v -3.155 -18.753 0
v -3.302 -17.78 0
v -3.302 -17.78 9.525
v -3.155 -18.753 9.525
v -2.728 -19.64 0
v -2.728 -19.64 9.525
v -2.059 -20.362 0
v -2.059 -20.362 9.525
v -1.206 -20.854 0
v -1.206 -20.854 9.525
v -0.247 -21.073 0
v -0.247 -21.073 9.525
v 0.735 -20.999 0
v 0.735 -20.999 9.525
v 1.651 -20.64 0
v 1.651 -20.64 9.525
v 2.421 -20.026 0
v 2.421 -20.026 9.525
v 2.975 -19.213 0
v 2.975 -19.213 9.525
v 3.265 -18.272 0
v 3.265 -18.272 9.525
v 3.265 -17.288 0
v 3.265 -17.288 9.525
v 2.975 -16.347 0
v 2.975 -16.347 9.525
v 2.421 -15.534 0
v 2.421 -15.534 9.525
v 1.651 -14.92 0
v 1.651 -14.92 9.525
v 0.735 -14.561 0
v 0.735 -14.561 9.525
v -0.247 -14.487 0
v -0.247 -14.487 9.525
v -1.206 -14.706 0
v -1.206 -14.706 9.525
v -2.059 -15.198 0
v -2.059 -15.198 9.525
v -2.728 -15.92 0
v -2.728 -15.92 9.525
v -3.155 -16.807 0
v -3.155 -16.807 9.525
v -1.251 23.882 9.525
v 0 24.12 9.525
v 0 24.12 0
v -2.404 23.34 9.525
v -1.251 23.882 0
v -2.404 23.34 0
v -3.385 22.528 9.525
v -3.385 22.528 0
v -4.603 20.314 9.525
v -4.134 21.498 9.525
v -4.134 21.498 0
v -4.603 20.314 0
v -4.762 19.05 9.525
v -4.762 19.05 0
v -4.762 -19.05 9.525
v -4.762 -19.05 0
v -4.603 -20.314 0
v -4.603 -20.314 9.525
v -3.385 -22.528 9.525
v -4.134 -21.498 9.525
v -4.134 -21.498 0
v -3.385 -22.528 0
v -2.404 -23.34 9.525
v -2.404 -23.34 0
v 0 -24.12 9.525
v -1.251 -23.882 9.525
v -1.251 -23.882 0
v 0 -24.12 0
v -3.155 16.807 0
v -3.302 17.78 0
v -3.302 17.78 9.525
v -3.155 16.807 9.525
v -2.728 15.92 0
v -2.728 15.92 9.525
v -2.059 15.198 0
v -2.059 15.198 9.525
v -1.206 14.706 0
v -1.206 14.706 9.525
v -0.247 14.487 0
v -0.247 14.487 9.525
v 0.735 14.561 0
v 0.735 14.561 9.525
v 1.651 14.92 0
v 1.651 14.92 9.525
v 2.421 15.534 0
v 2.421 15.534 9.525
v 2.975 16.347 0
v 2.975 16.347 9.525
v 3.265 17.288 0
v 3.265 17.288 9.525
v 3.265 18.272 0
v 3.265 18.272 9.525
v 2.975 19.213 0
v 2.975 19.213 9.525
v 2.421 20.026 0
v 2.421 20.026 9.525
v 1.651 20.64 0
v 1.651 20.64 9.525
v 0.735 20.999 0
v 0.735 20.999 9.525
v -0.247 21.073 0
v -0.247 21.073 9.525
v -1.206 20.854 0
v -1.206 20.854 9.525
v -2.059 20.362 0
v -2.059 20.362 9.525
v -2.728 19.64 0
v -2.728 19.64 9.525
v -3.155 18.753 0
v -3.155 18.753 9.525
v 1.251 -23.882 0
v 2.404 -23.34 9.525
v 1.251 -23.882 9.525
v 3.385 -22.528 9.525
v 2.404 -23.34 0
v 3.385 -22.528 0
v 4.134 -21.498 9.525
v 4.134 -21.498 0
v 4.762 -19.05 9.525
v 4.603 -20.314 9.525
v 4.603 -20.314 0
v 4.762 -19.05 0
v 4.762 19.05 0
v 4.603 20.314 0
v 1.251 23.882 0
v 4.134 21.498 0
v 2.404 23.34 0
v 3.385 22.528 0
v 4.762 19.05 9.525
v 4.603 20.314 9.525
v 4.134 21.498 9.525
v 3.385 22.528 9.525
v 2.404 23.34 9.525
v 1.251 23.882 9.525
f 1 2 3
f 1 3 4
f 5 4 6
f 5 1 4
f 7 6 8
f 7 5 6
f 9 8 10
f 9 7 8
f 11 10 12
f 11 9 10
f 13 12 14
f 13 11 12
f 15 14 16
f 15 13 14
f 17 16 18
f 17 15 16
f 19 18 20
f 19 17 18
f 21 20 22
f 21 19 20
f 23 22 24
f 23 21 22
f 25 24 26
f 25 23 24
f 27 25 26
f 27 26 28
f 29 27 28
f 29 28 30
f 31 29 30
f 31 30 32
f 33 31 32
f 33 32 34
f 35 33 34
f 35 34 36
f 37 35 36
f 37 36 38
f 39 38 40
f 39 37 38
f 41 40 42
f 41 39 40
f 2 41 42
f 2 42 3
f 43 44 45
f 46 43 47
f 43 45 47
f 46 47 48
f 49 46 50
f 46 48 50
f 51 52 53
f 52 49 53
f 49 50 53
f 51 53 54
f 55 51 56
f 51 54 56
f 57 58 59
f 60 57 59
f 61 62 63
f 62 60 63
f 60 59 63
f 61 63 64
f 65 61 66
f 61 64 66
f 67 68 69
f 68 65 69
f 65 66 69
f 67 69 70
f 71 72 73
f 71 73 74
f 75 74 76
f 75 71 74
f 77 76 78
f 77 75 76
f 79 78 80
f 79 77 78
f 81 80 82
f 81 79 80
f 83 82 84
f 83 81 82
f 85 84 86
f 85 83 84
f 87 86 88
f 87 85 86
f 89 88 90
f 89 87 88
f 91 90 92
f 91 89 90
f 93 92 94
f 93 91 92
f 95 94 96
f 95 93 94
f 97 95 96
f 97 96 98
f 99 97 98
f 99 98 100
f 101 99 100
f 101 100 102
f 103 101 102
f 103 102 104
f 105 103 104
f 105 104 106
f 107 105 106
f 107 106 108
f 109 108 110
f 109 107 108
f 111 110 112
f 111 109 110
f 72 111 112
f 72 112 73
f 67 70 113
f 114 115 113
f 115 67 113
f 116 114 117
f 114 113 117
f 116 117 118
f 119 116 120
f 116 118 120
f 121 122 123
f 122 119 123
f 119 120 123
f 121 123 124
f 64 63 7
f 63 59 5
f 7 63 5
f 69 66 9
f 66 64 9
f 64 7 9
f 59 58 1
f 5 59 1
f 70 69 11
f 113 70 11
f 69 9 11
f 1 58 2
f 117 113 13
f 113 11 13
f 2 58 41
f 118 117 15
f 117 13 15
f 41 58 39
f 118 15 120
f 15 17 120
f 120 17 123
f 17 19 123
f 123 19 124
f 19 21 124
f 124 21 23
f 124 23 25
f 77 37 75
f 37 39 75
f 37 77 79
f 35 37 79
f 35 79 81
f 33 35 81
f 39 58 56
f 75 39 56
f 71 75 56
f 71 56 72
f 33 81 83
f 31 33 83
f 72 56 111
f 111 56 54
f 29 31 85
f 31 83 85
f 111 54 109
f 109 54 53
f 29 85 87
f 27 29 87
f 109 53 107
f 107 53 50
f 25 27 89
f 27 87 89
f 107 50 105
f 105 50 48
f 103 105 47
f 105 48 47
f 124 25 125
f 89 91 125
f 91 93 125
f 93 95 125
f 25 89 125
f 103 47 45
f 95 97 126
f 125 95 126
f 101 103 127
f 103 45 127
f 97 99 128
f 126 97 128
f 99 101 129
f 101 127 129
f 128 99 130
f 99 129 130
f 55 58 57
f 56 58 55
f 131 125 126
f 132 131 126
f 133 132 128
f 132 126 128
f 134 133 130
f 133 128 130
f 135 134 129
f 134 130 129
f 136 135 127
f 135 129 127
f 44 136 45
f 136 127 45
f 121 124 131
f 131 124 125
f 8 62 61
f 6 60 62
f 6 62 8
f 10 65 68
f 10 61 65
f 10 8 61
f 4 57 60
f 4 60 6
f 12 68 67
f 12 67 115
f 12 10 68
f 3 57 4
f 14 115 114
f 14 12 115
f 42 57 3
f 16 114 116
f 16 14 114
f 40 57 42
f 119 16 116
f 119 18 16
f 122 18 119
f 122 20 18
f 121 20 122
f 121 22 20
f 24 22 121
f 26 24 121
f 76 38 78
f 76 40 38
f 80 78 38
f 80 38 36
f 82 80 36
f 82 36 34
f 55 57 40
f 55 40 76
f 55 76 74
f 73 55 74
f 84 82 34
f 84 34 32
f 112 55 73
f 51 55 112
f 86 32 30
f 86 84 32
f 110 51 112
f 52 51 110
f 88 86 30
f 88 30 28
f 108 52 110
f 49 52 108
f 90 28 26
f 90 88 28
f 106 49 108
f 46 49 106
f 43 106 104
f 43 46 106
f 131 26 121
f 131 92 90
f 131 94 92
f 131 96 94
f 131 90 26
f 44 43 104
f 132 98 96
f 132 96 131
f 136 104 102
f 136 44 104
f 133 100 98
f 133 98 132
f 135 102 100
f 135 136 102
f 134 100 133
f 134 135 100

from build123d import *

# Parameters (mm, degrees)
SKETCH1_W           = 9.525
SKETCH1_H           = 48.26
SKETCH1_R           = 3.302
BOSS_EXTRUDE1_DEPTH = 9.525
FILLET1_R           = 5.08


with BuildPart() as part:
    # Sketch1 → Boss-Extrude1 (new body)
    with BuildSketch(Plane.XY):
        Rectangle(SKETCH1_W, SKETCH1_H)
        with Locations(Location((0, -17.78, 0), (0, 0, 180))):
            Circle(SKETCH1_R, mode=Mode.SUBTRACT)
        with Locations(Location((0, 17.78, 0), (0, 0, 180))):
            Circle(SKETCH1_R, mode=Mode.SUBTRACT)
    extrude(amount=BOSS_EXTRUDE1_DEPTH)

    # Fillet1
    # the kernel refuses this fillet: 5.08 mm, written as the material it takes off along each edge
    with BuildSketch(Plane(origin=(-4.7625, -24.13, -12.7), x_dir=(1, 0, 0), z_dir=(0, 0, 1)), Plane(origin=(4.7625, -24.13, -12.7), x_dir=(0, 1, 0), z_dir=(0, 0, 1)), Plane(origin=(4.7625, 24.13, -12.7), x_dir=(-1, 0, 0), z_dir=(0, 0, 1))) as fillet1_piece_1:
        with BuildLine():
            CenterArc((FILLET1_R, FILLET1_R), FILLET1_R, 180, 90)
            Line((0, FILLET1_R), (0, 0))
            Line((0, 0), (FILLET1_R, 0))
        make_face()
    extrude(amount=34.925, mode=Mode.SUBTRACT)
    with BuildSketch(Plane(origin=(-4.7625, 24.13, -12.7), x_dir=(1, 0, 0), z_dir=(0, 0, 1))) as fillet1_piece_2:
        with BuildLine():
            CenterArc((FILLET1_R, -FILLET1_R), FILLET1_R, 90, 90)
            Line((0, -FILLET1_R), (0, 0))
            Line((0, 0), (FILLET1_R, 0))
        make_face()
    extrude(amount=34.925, mode=Mode.SUBTRACT)


solid = part.part
